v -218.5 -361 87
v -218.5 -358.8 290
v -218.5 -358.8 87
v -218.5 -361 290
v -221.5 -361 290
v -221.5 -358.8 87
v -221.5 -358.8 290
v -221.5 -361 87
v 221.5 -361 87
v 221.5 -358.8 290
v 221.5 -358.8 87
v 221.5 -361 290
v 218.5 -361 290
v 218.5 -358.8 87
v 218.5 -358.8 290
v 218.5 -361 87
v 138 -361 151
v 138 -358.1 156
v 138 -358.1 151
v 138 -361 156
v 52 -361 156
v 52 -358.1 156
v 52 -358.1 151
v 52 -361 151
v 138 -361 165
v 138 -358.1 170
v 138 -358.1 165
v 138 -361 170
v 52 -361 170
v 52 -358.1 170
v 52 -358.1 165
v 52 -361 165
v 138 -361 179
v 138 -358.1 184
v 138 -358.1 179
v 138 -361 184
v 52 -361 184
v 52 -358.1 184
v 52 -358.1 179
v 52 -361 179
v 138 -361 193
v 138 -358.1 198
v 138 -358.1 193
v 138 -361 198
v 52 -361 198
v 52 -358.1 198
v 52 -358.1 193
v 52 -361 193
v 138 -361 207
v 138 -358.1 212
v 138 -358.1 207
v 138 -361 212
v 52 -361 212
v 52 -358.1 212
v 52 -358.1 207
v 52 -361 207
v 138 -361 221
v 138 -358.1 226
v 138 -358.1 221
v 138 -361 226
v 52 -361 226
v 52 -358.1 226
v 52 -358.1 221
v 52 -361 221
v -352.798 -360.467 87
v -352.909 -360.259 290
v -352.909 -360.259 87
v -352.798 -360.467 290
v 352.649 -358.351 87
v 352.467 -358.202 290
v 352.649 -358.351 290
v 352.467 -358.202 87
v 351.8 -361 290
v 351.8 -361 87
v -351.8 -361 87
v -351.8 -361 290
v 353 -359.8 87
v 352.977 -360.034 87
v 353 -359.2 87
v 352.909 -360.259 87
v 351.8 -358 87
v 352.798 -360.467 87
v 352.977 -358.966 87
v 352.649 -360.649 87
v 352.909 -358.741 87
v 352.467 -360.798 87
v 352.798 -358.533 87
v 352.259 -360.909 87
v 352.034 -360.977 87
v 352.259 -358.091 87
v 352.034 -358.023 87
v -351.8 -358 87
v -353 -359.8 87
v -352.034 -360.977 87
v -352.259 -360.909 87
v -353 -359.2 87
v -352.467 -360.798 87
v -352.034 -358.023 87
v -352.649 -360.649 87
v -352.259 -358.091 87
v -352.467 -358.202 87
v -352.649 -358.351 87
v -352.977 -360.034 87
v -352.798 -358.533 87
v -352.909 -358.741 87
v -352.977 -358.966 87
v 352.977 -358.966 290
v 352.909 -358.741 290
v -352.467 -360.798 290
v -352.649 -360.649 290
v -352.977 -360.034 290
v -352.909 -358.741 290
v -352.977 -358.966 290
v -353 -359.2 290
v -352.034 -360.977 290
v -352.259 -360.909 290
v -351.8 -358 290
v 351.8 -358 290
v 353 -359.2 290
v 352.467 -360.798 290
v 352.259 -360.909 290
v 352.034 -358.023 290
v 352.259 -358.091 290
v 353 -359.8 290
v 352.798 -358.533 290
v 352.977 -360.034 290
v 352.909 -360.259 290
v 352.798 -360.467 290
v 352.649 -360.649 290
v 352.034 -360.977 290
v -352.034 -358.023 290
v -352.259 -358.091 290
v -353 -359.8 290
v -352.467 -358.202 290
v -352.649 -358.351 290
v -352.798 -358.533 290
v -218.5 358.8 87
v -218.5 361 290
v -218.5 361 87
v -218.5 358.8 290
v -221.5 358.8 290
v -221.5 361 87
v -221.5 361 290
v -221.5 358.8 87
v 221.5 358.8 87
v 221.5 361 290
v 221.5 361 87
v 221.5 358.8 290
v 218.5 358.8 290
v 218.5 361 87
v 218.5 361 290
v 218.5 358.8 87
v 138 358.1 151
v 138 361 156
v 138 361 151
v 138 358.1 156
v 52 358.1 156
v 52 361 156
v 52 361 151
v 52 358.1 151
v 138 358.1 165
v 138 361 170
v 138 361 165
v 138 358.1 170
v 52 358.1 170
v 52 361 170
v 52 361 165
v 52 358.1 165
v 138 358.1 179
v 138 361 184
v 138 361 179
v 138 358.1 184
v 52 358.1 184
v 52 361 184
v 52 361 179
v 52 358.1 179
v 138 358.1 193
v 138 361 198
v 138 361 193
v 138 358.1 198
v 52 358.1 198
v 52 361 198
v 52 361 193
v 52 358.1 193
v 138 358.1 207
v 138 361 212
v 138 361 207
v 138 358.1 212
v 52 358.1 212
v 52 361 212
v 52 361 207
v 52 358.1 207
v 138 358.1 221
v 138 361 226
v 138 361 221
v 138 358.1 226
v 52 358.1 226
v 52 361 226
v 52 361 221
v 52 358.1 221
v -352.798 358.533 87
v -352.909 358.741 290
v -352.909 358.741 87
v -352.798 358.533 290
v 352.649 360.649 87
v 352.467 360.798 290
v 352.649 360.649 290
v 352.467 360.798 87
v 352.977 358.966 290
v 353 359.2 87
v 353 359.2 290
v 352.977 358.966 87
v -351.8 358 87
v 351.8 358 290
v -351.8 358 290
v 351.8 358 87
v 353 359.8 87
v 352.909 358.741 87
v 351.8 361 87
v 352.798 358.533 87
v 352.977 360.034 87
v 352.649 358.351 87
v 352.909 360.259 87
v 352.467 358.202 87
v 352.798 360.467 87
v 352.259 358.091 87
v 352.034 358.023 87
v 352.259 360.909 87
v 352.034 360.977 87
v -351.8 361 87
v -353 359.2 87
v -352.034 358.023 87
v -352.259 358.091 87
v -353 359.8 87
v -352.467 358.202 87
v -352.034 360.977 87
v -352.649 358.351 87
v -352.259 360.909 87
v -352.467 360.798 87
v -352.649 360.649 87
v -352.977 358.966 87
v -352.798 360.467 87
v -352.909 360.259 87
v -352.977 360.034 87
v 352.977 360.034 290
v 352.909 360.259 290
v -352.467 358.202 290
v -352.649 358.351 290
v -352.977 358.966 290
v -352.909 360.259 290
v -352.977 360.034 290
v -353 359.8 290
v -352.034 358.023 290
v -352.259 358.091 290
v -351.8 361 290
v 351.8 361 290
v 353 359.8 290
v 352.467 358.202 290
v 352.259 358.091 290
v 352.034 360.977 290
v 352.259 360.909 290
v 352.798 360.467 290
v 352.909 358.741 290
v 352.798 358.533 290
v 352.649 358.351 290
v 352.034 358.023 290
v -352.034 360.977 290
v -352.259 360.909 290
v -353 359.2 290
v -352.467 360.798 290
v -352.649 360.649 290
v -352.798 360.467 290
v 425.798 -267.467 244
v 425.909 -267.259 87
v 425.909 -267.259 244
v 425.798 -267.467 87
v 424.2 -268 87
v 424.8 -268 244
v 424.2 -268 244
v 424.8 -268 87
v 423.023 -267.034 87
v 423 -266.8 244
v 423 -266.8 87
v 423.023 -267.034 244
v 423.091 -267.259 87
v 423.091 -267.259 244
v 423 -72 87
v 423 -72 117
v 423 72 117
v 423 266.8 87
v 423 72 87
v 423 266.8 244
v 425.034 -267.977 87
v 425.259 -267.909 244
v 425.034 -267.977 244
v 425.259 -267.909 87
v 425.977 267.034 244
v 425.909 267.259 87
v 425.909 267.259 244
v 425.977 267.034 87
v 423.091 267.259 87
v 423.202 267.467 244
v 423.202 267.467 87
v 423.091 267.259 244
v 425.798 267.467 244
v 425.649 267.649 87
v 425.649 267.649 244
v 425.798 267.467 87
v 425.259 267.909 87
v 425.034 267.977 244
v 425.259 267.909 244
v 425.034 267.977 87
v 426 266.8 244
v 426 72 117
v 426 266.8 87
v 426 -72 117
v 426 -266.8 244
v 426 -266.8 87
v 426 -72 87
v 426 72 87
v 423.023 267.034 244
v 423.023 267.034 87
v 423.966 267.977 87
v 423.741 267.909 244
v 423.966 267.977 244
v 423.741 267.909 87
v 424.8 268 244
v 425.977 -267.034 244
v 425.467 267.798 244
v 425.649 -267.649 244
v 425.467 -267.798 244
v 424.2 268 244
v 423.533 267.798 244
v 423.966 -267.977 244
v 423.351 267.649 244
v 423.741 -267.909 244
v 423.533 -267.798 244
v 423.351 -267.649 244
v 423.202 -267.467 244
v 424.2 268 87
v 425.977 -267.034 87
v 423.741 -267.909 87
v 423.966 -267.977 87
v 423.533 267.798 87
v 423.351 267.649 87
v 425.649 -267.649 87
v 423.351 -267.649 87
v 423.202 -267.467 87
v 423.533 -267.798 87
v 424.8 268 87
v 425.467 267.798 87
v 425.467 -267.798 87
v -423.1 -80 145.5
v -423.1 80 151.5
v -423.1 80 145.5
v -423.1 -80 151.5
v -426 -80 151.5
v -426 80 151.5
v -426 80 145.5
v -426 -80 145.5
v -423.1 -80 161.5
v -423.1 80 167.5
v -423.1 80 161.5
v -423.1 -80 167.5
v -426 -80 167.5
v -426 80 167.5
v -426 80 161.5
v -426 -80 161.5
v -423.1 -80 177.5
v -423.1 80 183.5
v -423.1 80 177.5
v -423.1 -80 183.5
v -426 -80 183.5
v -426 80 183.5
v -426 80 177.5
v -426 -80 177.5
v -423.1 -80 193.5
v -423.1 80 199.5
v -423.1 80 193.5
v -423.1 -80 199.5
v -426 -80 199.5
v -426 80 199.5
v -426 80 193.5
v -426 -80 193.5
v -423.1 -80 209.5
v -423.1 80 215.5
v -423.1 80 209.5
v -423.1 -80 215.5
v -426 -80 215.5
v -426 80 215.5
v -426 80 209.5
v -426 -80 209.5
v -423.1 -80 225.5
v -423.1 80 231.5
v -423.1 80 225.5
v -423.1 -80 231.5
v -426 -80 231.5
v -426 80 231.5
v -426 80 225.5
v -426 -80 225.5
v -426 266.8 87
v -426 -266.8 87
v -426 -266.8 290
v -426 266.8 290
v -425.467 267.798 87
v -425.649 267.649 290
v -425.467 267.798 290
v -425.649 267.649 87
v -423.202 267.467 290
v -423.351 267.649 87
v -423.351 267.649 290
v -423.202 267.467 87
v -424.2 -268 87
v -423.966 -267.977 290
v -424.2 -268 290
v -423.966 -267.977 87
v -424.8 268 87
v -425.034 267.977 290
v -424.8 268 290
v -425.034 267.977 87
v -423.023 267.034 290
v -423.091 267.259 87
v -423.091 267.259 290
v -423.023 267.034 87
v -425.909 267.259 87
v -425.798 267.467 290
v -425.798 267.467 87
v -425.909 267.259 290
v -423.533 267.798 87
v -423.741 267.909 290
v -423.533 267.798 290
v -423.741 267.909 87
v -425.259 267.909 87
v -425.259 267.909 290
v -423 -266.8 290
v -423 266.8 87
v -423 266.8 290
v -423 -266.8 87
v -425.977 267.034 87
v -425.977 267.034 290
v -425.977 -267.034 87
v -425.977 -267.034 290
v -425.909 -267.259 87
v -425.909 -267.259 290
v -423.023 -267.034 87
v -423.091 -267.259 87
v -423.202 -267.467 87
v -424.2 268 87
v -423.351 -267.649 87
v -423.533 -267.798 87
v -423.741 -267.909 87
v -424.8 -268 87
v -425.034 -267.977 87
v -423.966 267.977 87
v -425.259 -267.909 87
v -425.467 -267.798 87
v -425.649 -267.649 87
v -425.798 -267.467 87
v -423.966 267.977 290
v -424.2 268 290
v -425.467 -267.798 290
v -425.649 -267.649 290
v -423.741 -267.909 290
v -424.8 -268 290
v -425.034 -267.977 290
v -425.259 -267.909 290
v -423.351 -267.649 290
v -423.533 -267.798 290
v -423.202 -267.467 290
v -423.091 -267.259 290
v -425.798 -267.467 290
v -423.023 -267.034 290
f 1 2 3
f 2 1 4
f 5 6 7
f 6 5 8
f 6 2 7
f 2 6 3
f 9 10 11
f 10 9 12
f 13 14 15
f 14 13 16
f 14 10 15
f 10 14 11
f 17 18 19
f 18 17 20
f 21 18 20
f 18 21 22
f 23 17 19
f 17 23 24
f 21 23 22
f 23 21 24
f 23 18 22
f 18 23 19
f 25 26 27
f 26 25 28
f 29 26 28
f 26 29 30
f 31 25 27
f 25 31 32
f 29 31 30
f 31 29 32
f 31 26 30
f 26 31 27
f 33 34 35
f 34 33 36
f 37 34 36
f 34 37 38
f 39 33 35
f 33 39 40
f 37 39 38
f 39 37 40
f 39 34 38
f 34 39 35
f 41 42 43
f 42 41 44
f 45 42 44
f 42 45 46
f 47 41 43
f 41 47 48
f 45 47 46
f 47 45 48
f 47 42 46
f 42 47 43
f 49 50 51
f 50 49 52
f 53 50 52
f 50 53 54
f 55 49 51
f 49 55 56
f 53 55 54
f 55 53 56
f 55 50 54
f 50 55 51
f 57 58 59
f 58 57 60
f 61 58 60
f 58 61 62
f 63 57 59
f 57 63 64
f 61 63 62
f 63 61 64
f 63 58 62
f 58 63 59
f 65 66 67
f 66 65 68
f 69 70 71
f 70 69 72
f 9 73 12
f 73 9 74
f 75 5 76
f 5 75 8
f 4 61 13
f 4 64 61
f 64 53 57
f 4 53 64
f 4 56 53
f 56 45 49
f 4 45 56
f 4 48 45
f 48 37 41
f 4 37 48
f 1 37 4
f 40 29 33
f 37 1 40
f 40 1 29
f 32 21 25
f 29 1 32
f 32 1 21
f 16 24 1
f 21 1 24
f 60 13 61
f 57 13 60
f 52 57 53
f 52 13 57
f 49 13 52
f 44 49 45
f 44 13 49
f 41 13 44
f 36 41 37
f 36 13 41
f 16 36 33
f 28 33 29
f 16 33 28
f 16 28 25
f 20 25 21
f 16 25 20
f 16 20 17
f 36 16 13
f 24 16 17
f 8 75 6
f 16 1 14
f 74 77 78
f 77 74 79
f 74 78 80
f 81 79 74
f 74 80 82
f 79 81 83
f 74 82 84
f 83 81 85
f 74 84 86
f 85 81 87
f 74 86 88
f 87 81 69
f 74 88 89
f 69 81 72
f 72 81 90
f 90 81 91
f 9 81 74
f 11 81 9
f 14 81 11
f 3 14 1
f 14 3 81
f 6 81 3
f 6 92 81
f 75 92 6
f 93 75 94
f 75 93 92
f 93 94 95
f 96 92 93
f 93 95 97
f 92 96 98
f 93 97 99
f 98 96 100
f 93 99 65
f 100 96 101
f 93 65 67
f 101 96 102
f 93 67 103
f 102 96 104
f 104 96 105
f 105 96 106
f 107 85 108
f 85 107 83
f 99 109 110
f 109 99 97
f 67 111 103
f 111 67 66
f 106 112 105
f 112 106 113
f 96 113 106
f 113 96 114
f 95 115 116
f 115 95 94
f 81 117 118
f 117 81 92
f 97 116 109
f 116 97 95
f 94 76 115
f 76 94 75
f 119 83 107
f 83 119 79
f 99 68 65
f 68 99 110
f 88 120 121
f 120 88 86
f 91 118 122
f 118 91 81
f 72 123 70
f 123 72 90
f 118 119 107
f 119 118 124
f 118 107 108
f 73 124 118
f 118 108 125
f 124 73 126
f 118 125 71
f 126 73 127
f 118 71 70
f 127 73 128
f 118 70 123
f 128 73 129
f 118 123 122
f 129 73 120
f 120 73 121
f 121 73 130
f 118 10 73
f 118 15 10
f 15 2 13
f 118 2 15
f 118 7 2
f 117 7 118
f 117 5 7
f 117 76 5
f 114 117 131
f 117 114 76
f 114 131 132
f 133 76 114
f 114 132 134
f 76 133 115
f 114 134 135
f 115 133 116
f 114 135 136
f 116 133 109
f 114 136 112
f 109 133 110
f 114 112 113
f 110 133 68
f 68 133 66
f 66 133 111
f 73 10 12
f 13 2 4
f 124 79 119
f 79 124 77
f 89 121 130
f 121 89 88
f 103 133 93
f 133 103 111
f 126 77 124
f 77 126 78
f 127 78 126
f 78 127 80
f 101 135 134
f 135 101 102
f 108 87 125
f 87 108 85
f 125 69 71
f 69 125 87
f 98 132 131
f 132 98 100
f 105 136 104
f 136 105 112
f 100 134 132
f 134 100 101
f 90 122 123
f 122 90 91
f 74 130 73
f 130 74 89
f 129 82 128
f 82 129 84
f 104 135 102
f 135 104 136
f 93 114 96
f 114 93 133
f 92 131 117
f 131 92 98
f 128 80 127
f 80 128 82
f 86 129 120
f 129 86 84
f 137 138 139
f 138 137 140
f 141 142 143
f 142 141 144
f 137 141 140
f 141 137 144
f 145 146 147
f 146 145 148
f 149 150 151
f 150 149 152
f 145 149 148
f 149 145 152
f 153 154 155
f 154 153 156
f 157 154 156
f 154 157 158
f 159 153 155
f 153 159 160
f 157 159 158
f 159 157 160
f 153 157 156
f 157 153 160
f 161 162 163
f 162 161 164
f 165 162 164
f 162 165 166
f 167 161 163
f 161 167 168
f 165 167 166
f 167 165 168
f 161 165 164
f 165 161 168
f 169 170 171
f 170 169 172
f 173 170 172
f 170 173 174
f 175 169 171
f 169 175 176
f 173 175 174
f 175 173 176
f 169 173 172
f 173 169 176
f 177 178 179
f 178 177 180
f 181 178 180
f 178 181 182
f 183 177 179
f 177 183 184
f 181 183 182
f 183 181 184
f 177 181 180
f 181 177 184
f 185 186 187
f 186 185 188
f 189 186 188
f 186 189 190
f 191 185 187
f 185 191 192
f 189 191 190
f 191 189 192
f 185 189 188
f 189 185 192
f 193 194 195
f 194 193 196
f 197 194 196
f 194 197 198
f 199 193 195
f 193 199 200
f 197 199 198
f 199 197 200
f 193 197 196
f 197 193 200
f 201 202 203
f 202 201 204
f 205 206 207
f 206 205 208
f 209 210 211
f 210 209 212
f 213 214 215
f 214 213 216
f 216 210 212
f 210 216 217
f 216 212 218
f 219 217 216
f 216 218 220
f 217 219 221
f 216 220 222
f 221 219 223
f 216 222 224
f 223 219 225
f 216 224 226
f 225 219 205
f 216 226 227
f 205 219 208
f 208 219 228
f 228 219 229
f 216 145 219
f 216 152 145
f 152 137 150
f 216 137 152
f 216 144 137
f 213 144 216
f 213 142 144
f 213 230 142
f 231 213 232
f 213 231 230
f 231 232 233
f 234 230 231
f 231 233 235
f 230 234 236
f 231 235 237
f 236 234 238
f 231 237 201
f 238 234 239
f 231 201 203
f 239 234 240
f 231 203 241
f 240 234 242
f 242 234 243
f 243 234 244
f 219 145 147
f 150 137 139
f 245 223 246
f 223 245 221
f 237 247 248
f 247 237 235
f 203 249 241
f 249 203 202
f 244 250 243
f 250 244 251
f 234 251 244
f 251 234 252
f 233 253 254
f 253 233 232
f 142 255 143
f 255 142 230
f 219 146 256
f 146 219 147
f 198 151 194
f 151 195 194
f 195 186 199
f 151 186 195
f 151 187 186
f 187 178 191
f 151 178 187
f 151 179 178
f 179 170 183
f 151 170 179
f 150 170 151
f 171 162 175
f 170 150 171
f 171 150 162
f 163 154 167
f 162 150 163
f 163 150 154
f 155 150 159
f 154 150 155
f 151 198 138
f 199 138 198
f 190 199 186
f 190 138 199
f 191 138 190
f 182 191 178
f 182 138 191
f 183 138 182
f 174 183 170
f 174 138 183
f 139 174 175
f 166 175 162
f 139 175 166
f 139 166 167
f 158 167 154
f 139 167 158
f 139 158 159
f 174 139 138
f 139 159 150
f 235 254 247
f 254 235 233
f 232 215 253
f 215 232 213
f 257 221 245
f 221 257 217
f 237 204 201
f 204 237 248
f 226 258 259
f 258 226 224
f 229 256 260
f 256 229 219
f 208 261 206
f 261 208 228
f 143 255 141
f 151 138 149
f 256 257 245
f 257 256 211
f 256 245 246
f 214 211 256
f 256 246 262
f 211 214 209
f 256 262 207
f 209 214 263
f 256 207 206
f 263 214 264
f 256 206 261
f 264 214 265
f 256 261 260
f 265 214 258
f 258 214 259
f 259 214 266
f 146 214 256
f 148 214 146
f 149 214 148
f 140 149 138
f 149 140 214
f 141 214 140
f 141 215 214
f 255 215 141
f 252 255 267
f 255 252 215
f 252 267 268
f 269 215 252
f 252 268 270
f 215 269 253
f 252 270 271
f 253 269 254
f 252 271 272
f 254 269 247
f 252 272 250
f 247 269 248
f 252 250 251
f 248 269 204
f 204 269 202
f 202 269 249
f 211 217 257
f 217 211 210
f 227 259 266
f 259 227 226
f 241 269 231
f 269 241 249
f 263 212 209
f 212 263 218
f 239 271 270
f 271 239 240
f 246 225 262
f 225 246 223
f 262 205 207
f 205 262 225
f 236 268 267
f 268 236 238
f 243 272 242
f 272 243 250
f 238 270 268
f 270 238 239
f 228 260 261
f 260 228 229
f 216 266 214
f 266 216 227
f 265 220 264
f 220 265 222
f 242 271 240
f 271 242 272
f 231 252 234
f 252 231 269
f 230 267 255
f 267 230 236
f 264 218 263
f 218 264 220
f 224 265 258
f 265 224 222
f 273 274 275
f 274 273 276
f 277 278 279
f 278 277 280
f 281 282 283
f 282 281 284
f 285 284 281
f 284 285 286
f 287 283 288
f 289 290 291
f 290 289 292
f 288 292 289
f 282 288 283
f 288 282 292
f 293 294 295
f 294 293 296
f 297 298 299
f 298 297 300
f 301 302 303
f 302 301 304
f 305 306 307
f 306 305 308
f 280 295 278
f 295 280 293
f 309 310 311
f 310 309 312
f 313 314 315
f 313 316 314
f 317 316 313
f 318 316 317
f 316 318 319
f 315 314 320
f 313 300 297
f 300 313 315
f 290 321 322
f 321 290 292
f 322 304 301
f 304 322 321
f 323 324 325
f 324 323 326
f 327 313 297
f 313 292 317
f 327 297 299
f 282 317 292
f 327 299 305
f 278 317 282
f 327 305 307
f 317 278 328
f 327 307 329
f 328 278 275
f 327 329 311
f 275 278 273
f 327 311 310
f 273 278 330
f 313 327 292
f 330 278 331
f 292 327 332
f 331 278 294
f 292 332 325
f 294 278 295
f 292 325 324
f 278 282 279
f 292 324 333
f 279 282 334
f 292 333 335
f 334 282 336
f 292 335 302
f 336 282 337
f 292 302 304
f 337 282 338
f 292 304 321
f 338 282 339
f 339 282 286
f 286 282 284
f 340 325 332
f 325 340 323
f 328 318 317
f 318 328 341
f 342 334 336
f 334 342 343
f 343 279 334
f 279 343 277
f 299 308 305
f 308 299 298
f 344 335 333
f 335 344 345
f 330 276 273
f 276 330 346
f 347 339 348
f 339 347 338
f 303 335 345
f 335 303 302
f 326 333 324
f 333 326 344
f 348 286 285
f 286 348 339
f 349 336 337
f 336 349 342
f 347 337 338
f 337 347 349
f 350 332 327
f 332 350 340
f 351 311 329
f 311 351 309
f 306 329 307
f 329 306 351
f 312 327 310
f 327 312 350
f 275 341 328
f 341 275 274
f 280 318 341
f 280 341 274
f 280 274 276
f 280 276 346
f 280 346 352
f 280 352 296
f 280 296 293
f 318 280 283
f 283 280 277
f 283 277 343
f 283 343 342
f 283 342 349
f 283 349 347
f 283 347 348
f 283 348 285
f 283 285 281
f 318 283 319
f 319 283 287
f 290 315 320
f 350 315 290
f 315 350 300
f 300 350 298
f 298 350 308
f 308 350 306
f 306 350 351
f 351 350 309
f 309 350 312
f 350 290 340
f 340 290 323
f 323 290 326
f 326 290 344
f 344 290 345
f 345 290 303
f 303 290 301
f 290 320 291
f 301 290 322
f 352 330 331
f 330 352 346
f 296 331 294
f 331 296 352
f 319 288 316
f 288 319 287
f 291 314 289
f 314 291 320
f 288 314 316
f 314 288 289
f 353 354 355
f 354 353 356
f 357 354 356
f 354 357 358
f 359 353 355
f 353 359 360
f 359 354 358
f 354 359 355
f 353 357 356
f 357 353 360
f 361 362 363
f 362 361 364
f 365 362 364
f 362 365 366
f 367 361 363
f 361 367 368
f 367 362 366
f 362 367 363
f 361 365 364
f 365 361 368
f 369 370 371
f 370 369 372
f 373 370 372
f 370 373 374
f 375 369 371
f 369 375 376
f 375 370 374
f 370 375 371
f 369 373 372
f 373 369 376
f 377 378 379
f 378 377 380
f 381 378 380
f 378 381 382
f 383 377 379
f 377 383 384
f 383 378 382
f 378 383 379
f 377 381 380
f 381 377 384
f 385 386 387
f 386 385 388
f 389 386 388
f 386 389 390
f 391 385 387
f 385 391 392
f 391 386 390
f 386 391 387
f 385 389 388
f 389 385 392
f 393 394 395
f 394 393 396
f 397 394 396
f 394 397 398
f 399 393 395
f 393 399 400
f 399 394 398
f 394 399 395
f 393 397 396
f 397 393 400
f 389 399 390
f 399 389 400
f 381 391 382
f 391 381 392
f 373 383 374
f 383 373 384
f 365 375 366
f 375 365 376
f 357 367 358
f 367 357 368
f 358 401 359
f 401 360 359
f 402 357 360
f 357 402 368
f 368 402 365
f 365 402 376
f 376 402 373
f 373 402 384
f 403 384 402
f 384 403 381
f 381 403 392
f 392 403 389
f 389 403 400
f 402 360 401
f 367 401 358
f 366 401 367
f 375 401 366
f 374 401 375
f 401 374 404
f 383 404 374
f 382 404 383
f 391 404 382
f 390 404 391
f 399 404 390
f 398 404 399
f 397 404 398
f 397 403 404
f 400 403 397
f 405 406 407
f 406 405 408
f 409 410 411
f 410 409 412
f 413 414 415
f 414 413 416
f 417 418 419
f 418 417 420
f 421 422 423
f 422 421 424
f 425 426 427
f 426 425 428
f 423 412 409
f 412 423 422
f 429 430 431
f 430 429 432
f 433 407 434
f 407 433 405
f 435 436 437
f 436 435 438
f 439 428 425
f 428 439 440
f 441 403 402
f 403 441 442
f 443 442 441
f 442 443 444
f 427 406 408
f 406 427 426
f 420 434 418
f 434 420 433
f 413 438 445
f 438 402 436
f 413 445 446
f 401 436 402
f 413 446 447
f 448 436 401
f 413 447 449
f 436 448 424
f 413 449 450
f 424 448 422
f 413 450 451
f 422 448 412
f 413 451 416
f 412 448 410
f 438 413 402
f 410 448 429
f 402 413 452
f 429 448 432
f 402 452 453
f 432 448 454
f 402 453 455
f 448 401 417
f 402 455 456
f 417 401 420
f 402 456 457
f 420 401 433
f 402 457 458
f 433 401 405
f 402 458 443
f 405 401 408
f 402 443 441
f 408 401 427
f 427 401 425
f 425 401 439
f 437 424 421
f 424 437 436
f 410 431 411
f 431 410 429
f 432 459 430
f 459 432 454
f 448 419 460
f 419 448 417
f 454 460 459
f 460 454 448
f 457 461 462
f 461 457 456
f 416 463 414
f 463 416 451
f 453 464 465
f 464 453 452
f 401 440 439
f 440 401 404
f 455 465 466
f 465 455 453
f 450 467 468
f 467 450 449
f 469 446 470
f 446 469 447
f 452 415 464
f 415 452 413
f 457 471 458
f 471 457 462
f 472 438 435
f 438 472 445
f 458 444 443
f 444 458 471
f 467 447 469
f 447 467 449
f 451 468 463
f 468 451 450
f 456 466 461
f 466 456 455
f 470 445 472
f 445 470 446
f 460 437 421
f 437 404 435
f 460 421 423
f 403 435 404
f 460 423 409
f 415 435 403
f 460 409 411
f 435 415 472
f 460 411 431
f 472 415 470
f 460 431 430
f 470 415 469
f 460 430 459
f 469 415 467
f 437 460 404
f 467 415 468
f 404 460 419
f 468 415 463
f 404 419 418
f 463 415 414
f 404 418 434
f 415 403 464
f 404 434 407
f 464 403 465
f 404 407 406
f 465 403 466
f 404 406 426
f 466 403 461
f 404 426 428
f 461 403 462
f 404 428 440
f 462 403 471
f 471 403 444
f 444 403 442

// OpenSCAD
export_only = true;
include <main.scad>
body_skin_panels();
